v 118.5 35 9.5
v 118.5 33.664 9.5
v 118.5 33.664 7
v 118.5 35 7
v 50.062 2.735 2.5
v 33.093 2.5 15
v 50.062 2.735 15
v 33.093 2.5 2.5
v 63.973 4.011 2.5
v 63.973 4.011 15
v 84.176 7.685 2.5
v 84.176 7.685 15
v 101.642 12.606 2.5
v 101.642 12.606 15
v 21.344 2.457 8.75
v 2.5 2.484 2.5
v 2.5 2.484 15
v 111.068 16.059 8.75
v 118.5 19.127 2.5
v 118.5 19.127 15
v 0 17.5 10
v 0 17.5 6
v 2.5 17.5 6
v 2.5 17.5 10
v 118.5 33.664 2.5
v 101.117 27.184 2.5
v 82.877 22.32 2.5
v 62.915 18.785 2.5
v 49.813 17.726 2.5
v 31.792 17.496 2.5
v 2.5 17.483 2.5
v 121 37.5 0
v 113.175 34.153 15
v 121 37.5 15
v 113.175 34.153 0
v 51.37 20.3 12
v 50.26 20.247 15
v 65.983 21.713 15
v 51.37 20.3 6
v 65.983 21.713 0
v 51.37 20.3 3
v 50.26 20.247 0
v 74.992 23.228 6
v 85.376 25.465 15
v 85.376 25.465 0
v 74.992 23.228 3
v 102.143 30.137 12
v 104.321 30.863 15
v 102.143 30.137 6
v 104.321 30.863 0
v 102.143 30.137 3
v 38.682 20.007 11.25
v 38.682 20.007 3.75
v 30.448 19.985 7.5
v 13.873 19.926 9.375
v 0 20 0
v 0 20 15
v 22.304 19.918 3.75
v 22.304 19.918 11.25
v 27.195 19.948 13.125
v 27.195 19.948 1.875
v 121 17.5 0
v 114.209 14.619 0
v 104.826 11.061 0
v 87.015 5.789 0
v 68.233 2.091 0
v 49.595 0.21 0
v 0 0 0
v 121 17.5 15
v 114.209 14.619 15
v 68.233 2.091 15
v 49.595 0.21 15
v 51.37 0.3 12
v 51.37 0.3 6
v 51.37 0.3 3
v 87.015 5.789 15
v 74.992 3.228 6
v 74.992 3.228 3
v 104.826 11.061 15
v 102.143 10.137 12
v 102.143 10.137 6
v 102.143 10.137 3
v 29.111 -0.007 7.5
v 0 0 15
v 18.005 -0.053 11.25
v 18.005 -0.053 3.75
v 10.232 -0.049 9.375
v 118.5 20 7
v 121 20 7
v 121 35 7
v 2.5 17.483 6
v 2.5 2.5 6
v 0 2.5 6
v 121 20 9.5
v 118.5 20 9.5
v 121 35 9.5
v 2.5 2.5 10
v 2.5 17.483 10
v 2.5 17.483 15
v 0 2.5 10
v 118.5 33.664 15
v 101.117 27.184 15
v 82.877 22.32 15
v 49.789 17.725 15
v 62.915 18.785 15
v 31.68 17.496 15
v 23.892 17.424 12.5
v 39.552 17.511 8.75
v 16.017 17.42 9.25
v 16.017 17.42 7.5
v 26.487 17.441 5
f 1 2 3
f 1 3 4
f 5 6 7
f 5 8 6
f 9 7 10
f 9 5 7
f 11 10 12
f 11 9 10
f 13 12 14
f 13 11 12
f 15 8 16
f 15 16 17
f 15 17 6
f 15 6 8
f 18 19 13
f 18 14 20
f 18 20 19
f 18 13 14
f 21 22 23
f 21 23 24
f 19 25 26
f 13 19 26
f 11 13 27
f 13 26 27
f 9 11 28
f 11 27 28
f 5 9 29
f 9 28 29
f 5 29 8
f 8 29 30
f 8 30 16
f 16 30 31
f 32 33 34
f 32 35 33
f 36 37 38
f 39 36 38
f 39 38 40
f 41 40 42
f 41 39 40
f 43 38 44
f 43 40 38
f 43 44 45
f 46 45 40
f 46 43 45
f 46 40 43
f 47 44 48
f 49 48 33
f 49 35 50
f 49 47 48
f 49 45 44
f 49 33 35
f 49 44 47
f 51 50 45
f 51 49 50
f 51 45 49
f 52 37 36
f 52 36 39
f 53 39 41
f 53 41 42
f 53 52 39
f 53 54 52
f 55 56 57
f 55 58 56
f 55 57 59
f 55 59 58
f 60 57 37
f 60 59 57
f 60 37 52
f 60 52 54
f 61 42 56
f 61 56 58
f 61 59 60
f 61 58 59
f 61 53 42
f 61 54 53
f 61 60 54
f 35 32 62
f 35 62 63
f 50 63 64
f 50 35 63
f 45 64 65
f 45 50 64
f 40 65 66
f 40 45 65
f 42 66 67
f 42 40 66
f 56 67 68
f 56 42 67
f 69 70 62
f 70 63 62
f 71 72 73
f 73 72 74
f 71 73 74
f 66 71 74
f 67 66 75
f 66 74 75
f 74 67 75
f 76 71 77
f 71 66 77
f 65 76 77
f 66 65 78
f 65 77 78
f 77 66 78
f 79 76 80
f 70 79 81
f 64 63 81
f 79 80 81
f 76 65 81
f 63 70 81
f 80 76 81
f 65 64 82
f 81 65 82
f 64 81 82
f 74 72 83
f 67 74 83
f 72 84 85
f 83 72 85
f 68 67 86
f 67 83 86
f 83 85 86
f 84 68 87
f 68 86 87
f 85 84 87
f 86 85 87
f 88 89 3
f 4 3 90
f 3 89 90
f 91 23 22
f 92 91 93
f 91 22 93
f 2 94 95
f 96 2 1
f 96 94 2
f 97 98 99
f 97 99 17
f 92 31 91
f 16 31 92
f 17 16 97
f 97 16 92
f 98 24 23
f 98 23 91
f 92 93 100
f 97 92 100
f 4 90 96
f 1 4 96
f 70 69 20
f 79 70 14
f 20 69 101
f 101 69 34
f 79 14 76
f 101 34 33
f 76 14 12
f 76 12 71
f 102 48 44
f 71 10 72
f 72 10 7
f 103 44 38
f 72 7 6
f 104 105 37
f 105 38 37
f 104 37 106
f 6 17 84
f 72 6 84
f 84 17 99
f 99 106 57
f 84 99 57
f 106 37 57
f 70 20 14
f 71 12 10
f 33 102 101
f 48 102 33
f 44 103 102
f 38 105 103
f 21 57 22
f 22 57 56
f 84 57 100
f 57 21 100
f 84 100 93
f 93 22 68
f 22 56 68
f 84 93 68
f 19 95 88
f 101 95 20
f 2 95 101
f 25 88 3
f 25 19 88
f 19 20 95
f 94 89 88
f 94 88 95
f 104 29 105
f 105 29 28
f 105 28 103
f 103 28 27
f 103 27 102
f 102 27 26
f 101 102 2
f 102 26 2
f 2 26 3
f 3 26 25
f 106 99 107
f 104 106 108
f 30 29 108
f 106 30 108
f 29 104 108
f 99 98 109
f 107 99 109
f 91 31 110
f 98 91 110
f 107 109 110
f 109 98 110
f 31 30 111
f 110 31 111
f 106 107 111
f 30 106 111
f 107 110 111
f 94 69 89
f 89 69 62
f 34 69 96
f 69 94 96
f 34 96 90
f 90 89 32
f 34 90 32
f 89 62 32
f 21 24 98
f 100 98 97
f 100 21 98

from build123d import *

# Parameters (mm, degrees)
F1_DEPTH = 15
F2_T     = -2.5
F3_W     = 15
F3_H     = 4
F4_DEPTH = 2.5
F5_W     = 15
F5_H     = 2.5
F6_DEPTH = 2.5


with BuildPart() as f1:
    # F0 (on Top) → F1 (new body)
    with BuildSketch(Plane.XY):
        with BuildLine():
            add(Edge.make_bspline(
                [(0, 20), (26.7232054333, 19.8184425013), (27.1059169992, 20.1073908233), (52.679170319, 19.8610060675), (74.879722297, 22.6816028209), (102.0137306283, 29.4652239797), (115.5423223972, 35.0360646844), (121, 37.5)],
                knots=[0, 0, 0, 0, 0.2310258447, 0.4063525565, 0.6037669796, 0.8179426842, 1, 1, 1, 1], degree=3))
            Line((0, 20), (0, 0))
            add(Edge.make_bspline(
                [(0, 0), (18.4547173064, -0.1253374525), (29.9900721086, 0.0975745066), (51.8493286736, -0.1601969618), (75.3784279955, 2.7972650003), (100.9674350203, 9.0186773186), (117.3319965601, 15.8467441797), (121, 17.5)],
                knots=[0, 0, 0, 0, 0.2310258447, 0.4063525565, 0.6037669796, 0.8179426842, 1, 1, 1, 1], degree=3))
            Line((121, 17.5), (121, 37.5))
        make_face()
    extrude(amount=F1_DEPTH)

    # F2
    f2_openings = [f1.faces().sort_by_distance(p)[0] for p in [
        (60.510015, 13.844653, 15),
    ]]
    offset(amount=F2_T, openings=f2_openings, kind=Kind.INTERSECTION)

    # F3 (on face) → F4 (cut, through all)
    with BuildSketch(Plane(origin=(0, 0, 0), x_dir=(0, -1, 0), z_dir=(-1, 0, 0))):
        with Locations((-10, 8)):
            Rectangle(F3_W, F3_H)
    extrude(amount=-F4_DEPTH, mode=Mode.SUBTRACT)

    # F5 (on face) → F6 (cut, through all)
    with BuildSketch(Plane.YZ.offset(121)):
        with Locations((27.5, 8.25)):
            Rectangle(F5_W, F5_H)
    extrude(amount=-F6_DEPTH, mode=Mode.SUBTRACT)


solid = f1.part
